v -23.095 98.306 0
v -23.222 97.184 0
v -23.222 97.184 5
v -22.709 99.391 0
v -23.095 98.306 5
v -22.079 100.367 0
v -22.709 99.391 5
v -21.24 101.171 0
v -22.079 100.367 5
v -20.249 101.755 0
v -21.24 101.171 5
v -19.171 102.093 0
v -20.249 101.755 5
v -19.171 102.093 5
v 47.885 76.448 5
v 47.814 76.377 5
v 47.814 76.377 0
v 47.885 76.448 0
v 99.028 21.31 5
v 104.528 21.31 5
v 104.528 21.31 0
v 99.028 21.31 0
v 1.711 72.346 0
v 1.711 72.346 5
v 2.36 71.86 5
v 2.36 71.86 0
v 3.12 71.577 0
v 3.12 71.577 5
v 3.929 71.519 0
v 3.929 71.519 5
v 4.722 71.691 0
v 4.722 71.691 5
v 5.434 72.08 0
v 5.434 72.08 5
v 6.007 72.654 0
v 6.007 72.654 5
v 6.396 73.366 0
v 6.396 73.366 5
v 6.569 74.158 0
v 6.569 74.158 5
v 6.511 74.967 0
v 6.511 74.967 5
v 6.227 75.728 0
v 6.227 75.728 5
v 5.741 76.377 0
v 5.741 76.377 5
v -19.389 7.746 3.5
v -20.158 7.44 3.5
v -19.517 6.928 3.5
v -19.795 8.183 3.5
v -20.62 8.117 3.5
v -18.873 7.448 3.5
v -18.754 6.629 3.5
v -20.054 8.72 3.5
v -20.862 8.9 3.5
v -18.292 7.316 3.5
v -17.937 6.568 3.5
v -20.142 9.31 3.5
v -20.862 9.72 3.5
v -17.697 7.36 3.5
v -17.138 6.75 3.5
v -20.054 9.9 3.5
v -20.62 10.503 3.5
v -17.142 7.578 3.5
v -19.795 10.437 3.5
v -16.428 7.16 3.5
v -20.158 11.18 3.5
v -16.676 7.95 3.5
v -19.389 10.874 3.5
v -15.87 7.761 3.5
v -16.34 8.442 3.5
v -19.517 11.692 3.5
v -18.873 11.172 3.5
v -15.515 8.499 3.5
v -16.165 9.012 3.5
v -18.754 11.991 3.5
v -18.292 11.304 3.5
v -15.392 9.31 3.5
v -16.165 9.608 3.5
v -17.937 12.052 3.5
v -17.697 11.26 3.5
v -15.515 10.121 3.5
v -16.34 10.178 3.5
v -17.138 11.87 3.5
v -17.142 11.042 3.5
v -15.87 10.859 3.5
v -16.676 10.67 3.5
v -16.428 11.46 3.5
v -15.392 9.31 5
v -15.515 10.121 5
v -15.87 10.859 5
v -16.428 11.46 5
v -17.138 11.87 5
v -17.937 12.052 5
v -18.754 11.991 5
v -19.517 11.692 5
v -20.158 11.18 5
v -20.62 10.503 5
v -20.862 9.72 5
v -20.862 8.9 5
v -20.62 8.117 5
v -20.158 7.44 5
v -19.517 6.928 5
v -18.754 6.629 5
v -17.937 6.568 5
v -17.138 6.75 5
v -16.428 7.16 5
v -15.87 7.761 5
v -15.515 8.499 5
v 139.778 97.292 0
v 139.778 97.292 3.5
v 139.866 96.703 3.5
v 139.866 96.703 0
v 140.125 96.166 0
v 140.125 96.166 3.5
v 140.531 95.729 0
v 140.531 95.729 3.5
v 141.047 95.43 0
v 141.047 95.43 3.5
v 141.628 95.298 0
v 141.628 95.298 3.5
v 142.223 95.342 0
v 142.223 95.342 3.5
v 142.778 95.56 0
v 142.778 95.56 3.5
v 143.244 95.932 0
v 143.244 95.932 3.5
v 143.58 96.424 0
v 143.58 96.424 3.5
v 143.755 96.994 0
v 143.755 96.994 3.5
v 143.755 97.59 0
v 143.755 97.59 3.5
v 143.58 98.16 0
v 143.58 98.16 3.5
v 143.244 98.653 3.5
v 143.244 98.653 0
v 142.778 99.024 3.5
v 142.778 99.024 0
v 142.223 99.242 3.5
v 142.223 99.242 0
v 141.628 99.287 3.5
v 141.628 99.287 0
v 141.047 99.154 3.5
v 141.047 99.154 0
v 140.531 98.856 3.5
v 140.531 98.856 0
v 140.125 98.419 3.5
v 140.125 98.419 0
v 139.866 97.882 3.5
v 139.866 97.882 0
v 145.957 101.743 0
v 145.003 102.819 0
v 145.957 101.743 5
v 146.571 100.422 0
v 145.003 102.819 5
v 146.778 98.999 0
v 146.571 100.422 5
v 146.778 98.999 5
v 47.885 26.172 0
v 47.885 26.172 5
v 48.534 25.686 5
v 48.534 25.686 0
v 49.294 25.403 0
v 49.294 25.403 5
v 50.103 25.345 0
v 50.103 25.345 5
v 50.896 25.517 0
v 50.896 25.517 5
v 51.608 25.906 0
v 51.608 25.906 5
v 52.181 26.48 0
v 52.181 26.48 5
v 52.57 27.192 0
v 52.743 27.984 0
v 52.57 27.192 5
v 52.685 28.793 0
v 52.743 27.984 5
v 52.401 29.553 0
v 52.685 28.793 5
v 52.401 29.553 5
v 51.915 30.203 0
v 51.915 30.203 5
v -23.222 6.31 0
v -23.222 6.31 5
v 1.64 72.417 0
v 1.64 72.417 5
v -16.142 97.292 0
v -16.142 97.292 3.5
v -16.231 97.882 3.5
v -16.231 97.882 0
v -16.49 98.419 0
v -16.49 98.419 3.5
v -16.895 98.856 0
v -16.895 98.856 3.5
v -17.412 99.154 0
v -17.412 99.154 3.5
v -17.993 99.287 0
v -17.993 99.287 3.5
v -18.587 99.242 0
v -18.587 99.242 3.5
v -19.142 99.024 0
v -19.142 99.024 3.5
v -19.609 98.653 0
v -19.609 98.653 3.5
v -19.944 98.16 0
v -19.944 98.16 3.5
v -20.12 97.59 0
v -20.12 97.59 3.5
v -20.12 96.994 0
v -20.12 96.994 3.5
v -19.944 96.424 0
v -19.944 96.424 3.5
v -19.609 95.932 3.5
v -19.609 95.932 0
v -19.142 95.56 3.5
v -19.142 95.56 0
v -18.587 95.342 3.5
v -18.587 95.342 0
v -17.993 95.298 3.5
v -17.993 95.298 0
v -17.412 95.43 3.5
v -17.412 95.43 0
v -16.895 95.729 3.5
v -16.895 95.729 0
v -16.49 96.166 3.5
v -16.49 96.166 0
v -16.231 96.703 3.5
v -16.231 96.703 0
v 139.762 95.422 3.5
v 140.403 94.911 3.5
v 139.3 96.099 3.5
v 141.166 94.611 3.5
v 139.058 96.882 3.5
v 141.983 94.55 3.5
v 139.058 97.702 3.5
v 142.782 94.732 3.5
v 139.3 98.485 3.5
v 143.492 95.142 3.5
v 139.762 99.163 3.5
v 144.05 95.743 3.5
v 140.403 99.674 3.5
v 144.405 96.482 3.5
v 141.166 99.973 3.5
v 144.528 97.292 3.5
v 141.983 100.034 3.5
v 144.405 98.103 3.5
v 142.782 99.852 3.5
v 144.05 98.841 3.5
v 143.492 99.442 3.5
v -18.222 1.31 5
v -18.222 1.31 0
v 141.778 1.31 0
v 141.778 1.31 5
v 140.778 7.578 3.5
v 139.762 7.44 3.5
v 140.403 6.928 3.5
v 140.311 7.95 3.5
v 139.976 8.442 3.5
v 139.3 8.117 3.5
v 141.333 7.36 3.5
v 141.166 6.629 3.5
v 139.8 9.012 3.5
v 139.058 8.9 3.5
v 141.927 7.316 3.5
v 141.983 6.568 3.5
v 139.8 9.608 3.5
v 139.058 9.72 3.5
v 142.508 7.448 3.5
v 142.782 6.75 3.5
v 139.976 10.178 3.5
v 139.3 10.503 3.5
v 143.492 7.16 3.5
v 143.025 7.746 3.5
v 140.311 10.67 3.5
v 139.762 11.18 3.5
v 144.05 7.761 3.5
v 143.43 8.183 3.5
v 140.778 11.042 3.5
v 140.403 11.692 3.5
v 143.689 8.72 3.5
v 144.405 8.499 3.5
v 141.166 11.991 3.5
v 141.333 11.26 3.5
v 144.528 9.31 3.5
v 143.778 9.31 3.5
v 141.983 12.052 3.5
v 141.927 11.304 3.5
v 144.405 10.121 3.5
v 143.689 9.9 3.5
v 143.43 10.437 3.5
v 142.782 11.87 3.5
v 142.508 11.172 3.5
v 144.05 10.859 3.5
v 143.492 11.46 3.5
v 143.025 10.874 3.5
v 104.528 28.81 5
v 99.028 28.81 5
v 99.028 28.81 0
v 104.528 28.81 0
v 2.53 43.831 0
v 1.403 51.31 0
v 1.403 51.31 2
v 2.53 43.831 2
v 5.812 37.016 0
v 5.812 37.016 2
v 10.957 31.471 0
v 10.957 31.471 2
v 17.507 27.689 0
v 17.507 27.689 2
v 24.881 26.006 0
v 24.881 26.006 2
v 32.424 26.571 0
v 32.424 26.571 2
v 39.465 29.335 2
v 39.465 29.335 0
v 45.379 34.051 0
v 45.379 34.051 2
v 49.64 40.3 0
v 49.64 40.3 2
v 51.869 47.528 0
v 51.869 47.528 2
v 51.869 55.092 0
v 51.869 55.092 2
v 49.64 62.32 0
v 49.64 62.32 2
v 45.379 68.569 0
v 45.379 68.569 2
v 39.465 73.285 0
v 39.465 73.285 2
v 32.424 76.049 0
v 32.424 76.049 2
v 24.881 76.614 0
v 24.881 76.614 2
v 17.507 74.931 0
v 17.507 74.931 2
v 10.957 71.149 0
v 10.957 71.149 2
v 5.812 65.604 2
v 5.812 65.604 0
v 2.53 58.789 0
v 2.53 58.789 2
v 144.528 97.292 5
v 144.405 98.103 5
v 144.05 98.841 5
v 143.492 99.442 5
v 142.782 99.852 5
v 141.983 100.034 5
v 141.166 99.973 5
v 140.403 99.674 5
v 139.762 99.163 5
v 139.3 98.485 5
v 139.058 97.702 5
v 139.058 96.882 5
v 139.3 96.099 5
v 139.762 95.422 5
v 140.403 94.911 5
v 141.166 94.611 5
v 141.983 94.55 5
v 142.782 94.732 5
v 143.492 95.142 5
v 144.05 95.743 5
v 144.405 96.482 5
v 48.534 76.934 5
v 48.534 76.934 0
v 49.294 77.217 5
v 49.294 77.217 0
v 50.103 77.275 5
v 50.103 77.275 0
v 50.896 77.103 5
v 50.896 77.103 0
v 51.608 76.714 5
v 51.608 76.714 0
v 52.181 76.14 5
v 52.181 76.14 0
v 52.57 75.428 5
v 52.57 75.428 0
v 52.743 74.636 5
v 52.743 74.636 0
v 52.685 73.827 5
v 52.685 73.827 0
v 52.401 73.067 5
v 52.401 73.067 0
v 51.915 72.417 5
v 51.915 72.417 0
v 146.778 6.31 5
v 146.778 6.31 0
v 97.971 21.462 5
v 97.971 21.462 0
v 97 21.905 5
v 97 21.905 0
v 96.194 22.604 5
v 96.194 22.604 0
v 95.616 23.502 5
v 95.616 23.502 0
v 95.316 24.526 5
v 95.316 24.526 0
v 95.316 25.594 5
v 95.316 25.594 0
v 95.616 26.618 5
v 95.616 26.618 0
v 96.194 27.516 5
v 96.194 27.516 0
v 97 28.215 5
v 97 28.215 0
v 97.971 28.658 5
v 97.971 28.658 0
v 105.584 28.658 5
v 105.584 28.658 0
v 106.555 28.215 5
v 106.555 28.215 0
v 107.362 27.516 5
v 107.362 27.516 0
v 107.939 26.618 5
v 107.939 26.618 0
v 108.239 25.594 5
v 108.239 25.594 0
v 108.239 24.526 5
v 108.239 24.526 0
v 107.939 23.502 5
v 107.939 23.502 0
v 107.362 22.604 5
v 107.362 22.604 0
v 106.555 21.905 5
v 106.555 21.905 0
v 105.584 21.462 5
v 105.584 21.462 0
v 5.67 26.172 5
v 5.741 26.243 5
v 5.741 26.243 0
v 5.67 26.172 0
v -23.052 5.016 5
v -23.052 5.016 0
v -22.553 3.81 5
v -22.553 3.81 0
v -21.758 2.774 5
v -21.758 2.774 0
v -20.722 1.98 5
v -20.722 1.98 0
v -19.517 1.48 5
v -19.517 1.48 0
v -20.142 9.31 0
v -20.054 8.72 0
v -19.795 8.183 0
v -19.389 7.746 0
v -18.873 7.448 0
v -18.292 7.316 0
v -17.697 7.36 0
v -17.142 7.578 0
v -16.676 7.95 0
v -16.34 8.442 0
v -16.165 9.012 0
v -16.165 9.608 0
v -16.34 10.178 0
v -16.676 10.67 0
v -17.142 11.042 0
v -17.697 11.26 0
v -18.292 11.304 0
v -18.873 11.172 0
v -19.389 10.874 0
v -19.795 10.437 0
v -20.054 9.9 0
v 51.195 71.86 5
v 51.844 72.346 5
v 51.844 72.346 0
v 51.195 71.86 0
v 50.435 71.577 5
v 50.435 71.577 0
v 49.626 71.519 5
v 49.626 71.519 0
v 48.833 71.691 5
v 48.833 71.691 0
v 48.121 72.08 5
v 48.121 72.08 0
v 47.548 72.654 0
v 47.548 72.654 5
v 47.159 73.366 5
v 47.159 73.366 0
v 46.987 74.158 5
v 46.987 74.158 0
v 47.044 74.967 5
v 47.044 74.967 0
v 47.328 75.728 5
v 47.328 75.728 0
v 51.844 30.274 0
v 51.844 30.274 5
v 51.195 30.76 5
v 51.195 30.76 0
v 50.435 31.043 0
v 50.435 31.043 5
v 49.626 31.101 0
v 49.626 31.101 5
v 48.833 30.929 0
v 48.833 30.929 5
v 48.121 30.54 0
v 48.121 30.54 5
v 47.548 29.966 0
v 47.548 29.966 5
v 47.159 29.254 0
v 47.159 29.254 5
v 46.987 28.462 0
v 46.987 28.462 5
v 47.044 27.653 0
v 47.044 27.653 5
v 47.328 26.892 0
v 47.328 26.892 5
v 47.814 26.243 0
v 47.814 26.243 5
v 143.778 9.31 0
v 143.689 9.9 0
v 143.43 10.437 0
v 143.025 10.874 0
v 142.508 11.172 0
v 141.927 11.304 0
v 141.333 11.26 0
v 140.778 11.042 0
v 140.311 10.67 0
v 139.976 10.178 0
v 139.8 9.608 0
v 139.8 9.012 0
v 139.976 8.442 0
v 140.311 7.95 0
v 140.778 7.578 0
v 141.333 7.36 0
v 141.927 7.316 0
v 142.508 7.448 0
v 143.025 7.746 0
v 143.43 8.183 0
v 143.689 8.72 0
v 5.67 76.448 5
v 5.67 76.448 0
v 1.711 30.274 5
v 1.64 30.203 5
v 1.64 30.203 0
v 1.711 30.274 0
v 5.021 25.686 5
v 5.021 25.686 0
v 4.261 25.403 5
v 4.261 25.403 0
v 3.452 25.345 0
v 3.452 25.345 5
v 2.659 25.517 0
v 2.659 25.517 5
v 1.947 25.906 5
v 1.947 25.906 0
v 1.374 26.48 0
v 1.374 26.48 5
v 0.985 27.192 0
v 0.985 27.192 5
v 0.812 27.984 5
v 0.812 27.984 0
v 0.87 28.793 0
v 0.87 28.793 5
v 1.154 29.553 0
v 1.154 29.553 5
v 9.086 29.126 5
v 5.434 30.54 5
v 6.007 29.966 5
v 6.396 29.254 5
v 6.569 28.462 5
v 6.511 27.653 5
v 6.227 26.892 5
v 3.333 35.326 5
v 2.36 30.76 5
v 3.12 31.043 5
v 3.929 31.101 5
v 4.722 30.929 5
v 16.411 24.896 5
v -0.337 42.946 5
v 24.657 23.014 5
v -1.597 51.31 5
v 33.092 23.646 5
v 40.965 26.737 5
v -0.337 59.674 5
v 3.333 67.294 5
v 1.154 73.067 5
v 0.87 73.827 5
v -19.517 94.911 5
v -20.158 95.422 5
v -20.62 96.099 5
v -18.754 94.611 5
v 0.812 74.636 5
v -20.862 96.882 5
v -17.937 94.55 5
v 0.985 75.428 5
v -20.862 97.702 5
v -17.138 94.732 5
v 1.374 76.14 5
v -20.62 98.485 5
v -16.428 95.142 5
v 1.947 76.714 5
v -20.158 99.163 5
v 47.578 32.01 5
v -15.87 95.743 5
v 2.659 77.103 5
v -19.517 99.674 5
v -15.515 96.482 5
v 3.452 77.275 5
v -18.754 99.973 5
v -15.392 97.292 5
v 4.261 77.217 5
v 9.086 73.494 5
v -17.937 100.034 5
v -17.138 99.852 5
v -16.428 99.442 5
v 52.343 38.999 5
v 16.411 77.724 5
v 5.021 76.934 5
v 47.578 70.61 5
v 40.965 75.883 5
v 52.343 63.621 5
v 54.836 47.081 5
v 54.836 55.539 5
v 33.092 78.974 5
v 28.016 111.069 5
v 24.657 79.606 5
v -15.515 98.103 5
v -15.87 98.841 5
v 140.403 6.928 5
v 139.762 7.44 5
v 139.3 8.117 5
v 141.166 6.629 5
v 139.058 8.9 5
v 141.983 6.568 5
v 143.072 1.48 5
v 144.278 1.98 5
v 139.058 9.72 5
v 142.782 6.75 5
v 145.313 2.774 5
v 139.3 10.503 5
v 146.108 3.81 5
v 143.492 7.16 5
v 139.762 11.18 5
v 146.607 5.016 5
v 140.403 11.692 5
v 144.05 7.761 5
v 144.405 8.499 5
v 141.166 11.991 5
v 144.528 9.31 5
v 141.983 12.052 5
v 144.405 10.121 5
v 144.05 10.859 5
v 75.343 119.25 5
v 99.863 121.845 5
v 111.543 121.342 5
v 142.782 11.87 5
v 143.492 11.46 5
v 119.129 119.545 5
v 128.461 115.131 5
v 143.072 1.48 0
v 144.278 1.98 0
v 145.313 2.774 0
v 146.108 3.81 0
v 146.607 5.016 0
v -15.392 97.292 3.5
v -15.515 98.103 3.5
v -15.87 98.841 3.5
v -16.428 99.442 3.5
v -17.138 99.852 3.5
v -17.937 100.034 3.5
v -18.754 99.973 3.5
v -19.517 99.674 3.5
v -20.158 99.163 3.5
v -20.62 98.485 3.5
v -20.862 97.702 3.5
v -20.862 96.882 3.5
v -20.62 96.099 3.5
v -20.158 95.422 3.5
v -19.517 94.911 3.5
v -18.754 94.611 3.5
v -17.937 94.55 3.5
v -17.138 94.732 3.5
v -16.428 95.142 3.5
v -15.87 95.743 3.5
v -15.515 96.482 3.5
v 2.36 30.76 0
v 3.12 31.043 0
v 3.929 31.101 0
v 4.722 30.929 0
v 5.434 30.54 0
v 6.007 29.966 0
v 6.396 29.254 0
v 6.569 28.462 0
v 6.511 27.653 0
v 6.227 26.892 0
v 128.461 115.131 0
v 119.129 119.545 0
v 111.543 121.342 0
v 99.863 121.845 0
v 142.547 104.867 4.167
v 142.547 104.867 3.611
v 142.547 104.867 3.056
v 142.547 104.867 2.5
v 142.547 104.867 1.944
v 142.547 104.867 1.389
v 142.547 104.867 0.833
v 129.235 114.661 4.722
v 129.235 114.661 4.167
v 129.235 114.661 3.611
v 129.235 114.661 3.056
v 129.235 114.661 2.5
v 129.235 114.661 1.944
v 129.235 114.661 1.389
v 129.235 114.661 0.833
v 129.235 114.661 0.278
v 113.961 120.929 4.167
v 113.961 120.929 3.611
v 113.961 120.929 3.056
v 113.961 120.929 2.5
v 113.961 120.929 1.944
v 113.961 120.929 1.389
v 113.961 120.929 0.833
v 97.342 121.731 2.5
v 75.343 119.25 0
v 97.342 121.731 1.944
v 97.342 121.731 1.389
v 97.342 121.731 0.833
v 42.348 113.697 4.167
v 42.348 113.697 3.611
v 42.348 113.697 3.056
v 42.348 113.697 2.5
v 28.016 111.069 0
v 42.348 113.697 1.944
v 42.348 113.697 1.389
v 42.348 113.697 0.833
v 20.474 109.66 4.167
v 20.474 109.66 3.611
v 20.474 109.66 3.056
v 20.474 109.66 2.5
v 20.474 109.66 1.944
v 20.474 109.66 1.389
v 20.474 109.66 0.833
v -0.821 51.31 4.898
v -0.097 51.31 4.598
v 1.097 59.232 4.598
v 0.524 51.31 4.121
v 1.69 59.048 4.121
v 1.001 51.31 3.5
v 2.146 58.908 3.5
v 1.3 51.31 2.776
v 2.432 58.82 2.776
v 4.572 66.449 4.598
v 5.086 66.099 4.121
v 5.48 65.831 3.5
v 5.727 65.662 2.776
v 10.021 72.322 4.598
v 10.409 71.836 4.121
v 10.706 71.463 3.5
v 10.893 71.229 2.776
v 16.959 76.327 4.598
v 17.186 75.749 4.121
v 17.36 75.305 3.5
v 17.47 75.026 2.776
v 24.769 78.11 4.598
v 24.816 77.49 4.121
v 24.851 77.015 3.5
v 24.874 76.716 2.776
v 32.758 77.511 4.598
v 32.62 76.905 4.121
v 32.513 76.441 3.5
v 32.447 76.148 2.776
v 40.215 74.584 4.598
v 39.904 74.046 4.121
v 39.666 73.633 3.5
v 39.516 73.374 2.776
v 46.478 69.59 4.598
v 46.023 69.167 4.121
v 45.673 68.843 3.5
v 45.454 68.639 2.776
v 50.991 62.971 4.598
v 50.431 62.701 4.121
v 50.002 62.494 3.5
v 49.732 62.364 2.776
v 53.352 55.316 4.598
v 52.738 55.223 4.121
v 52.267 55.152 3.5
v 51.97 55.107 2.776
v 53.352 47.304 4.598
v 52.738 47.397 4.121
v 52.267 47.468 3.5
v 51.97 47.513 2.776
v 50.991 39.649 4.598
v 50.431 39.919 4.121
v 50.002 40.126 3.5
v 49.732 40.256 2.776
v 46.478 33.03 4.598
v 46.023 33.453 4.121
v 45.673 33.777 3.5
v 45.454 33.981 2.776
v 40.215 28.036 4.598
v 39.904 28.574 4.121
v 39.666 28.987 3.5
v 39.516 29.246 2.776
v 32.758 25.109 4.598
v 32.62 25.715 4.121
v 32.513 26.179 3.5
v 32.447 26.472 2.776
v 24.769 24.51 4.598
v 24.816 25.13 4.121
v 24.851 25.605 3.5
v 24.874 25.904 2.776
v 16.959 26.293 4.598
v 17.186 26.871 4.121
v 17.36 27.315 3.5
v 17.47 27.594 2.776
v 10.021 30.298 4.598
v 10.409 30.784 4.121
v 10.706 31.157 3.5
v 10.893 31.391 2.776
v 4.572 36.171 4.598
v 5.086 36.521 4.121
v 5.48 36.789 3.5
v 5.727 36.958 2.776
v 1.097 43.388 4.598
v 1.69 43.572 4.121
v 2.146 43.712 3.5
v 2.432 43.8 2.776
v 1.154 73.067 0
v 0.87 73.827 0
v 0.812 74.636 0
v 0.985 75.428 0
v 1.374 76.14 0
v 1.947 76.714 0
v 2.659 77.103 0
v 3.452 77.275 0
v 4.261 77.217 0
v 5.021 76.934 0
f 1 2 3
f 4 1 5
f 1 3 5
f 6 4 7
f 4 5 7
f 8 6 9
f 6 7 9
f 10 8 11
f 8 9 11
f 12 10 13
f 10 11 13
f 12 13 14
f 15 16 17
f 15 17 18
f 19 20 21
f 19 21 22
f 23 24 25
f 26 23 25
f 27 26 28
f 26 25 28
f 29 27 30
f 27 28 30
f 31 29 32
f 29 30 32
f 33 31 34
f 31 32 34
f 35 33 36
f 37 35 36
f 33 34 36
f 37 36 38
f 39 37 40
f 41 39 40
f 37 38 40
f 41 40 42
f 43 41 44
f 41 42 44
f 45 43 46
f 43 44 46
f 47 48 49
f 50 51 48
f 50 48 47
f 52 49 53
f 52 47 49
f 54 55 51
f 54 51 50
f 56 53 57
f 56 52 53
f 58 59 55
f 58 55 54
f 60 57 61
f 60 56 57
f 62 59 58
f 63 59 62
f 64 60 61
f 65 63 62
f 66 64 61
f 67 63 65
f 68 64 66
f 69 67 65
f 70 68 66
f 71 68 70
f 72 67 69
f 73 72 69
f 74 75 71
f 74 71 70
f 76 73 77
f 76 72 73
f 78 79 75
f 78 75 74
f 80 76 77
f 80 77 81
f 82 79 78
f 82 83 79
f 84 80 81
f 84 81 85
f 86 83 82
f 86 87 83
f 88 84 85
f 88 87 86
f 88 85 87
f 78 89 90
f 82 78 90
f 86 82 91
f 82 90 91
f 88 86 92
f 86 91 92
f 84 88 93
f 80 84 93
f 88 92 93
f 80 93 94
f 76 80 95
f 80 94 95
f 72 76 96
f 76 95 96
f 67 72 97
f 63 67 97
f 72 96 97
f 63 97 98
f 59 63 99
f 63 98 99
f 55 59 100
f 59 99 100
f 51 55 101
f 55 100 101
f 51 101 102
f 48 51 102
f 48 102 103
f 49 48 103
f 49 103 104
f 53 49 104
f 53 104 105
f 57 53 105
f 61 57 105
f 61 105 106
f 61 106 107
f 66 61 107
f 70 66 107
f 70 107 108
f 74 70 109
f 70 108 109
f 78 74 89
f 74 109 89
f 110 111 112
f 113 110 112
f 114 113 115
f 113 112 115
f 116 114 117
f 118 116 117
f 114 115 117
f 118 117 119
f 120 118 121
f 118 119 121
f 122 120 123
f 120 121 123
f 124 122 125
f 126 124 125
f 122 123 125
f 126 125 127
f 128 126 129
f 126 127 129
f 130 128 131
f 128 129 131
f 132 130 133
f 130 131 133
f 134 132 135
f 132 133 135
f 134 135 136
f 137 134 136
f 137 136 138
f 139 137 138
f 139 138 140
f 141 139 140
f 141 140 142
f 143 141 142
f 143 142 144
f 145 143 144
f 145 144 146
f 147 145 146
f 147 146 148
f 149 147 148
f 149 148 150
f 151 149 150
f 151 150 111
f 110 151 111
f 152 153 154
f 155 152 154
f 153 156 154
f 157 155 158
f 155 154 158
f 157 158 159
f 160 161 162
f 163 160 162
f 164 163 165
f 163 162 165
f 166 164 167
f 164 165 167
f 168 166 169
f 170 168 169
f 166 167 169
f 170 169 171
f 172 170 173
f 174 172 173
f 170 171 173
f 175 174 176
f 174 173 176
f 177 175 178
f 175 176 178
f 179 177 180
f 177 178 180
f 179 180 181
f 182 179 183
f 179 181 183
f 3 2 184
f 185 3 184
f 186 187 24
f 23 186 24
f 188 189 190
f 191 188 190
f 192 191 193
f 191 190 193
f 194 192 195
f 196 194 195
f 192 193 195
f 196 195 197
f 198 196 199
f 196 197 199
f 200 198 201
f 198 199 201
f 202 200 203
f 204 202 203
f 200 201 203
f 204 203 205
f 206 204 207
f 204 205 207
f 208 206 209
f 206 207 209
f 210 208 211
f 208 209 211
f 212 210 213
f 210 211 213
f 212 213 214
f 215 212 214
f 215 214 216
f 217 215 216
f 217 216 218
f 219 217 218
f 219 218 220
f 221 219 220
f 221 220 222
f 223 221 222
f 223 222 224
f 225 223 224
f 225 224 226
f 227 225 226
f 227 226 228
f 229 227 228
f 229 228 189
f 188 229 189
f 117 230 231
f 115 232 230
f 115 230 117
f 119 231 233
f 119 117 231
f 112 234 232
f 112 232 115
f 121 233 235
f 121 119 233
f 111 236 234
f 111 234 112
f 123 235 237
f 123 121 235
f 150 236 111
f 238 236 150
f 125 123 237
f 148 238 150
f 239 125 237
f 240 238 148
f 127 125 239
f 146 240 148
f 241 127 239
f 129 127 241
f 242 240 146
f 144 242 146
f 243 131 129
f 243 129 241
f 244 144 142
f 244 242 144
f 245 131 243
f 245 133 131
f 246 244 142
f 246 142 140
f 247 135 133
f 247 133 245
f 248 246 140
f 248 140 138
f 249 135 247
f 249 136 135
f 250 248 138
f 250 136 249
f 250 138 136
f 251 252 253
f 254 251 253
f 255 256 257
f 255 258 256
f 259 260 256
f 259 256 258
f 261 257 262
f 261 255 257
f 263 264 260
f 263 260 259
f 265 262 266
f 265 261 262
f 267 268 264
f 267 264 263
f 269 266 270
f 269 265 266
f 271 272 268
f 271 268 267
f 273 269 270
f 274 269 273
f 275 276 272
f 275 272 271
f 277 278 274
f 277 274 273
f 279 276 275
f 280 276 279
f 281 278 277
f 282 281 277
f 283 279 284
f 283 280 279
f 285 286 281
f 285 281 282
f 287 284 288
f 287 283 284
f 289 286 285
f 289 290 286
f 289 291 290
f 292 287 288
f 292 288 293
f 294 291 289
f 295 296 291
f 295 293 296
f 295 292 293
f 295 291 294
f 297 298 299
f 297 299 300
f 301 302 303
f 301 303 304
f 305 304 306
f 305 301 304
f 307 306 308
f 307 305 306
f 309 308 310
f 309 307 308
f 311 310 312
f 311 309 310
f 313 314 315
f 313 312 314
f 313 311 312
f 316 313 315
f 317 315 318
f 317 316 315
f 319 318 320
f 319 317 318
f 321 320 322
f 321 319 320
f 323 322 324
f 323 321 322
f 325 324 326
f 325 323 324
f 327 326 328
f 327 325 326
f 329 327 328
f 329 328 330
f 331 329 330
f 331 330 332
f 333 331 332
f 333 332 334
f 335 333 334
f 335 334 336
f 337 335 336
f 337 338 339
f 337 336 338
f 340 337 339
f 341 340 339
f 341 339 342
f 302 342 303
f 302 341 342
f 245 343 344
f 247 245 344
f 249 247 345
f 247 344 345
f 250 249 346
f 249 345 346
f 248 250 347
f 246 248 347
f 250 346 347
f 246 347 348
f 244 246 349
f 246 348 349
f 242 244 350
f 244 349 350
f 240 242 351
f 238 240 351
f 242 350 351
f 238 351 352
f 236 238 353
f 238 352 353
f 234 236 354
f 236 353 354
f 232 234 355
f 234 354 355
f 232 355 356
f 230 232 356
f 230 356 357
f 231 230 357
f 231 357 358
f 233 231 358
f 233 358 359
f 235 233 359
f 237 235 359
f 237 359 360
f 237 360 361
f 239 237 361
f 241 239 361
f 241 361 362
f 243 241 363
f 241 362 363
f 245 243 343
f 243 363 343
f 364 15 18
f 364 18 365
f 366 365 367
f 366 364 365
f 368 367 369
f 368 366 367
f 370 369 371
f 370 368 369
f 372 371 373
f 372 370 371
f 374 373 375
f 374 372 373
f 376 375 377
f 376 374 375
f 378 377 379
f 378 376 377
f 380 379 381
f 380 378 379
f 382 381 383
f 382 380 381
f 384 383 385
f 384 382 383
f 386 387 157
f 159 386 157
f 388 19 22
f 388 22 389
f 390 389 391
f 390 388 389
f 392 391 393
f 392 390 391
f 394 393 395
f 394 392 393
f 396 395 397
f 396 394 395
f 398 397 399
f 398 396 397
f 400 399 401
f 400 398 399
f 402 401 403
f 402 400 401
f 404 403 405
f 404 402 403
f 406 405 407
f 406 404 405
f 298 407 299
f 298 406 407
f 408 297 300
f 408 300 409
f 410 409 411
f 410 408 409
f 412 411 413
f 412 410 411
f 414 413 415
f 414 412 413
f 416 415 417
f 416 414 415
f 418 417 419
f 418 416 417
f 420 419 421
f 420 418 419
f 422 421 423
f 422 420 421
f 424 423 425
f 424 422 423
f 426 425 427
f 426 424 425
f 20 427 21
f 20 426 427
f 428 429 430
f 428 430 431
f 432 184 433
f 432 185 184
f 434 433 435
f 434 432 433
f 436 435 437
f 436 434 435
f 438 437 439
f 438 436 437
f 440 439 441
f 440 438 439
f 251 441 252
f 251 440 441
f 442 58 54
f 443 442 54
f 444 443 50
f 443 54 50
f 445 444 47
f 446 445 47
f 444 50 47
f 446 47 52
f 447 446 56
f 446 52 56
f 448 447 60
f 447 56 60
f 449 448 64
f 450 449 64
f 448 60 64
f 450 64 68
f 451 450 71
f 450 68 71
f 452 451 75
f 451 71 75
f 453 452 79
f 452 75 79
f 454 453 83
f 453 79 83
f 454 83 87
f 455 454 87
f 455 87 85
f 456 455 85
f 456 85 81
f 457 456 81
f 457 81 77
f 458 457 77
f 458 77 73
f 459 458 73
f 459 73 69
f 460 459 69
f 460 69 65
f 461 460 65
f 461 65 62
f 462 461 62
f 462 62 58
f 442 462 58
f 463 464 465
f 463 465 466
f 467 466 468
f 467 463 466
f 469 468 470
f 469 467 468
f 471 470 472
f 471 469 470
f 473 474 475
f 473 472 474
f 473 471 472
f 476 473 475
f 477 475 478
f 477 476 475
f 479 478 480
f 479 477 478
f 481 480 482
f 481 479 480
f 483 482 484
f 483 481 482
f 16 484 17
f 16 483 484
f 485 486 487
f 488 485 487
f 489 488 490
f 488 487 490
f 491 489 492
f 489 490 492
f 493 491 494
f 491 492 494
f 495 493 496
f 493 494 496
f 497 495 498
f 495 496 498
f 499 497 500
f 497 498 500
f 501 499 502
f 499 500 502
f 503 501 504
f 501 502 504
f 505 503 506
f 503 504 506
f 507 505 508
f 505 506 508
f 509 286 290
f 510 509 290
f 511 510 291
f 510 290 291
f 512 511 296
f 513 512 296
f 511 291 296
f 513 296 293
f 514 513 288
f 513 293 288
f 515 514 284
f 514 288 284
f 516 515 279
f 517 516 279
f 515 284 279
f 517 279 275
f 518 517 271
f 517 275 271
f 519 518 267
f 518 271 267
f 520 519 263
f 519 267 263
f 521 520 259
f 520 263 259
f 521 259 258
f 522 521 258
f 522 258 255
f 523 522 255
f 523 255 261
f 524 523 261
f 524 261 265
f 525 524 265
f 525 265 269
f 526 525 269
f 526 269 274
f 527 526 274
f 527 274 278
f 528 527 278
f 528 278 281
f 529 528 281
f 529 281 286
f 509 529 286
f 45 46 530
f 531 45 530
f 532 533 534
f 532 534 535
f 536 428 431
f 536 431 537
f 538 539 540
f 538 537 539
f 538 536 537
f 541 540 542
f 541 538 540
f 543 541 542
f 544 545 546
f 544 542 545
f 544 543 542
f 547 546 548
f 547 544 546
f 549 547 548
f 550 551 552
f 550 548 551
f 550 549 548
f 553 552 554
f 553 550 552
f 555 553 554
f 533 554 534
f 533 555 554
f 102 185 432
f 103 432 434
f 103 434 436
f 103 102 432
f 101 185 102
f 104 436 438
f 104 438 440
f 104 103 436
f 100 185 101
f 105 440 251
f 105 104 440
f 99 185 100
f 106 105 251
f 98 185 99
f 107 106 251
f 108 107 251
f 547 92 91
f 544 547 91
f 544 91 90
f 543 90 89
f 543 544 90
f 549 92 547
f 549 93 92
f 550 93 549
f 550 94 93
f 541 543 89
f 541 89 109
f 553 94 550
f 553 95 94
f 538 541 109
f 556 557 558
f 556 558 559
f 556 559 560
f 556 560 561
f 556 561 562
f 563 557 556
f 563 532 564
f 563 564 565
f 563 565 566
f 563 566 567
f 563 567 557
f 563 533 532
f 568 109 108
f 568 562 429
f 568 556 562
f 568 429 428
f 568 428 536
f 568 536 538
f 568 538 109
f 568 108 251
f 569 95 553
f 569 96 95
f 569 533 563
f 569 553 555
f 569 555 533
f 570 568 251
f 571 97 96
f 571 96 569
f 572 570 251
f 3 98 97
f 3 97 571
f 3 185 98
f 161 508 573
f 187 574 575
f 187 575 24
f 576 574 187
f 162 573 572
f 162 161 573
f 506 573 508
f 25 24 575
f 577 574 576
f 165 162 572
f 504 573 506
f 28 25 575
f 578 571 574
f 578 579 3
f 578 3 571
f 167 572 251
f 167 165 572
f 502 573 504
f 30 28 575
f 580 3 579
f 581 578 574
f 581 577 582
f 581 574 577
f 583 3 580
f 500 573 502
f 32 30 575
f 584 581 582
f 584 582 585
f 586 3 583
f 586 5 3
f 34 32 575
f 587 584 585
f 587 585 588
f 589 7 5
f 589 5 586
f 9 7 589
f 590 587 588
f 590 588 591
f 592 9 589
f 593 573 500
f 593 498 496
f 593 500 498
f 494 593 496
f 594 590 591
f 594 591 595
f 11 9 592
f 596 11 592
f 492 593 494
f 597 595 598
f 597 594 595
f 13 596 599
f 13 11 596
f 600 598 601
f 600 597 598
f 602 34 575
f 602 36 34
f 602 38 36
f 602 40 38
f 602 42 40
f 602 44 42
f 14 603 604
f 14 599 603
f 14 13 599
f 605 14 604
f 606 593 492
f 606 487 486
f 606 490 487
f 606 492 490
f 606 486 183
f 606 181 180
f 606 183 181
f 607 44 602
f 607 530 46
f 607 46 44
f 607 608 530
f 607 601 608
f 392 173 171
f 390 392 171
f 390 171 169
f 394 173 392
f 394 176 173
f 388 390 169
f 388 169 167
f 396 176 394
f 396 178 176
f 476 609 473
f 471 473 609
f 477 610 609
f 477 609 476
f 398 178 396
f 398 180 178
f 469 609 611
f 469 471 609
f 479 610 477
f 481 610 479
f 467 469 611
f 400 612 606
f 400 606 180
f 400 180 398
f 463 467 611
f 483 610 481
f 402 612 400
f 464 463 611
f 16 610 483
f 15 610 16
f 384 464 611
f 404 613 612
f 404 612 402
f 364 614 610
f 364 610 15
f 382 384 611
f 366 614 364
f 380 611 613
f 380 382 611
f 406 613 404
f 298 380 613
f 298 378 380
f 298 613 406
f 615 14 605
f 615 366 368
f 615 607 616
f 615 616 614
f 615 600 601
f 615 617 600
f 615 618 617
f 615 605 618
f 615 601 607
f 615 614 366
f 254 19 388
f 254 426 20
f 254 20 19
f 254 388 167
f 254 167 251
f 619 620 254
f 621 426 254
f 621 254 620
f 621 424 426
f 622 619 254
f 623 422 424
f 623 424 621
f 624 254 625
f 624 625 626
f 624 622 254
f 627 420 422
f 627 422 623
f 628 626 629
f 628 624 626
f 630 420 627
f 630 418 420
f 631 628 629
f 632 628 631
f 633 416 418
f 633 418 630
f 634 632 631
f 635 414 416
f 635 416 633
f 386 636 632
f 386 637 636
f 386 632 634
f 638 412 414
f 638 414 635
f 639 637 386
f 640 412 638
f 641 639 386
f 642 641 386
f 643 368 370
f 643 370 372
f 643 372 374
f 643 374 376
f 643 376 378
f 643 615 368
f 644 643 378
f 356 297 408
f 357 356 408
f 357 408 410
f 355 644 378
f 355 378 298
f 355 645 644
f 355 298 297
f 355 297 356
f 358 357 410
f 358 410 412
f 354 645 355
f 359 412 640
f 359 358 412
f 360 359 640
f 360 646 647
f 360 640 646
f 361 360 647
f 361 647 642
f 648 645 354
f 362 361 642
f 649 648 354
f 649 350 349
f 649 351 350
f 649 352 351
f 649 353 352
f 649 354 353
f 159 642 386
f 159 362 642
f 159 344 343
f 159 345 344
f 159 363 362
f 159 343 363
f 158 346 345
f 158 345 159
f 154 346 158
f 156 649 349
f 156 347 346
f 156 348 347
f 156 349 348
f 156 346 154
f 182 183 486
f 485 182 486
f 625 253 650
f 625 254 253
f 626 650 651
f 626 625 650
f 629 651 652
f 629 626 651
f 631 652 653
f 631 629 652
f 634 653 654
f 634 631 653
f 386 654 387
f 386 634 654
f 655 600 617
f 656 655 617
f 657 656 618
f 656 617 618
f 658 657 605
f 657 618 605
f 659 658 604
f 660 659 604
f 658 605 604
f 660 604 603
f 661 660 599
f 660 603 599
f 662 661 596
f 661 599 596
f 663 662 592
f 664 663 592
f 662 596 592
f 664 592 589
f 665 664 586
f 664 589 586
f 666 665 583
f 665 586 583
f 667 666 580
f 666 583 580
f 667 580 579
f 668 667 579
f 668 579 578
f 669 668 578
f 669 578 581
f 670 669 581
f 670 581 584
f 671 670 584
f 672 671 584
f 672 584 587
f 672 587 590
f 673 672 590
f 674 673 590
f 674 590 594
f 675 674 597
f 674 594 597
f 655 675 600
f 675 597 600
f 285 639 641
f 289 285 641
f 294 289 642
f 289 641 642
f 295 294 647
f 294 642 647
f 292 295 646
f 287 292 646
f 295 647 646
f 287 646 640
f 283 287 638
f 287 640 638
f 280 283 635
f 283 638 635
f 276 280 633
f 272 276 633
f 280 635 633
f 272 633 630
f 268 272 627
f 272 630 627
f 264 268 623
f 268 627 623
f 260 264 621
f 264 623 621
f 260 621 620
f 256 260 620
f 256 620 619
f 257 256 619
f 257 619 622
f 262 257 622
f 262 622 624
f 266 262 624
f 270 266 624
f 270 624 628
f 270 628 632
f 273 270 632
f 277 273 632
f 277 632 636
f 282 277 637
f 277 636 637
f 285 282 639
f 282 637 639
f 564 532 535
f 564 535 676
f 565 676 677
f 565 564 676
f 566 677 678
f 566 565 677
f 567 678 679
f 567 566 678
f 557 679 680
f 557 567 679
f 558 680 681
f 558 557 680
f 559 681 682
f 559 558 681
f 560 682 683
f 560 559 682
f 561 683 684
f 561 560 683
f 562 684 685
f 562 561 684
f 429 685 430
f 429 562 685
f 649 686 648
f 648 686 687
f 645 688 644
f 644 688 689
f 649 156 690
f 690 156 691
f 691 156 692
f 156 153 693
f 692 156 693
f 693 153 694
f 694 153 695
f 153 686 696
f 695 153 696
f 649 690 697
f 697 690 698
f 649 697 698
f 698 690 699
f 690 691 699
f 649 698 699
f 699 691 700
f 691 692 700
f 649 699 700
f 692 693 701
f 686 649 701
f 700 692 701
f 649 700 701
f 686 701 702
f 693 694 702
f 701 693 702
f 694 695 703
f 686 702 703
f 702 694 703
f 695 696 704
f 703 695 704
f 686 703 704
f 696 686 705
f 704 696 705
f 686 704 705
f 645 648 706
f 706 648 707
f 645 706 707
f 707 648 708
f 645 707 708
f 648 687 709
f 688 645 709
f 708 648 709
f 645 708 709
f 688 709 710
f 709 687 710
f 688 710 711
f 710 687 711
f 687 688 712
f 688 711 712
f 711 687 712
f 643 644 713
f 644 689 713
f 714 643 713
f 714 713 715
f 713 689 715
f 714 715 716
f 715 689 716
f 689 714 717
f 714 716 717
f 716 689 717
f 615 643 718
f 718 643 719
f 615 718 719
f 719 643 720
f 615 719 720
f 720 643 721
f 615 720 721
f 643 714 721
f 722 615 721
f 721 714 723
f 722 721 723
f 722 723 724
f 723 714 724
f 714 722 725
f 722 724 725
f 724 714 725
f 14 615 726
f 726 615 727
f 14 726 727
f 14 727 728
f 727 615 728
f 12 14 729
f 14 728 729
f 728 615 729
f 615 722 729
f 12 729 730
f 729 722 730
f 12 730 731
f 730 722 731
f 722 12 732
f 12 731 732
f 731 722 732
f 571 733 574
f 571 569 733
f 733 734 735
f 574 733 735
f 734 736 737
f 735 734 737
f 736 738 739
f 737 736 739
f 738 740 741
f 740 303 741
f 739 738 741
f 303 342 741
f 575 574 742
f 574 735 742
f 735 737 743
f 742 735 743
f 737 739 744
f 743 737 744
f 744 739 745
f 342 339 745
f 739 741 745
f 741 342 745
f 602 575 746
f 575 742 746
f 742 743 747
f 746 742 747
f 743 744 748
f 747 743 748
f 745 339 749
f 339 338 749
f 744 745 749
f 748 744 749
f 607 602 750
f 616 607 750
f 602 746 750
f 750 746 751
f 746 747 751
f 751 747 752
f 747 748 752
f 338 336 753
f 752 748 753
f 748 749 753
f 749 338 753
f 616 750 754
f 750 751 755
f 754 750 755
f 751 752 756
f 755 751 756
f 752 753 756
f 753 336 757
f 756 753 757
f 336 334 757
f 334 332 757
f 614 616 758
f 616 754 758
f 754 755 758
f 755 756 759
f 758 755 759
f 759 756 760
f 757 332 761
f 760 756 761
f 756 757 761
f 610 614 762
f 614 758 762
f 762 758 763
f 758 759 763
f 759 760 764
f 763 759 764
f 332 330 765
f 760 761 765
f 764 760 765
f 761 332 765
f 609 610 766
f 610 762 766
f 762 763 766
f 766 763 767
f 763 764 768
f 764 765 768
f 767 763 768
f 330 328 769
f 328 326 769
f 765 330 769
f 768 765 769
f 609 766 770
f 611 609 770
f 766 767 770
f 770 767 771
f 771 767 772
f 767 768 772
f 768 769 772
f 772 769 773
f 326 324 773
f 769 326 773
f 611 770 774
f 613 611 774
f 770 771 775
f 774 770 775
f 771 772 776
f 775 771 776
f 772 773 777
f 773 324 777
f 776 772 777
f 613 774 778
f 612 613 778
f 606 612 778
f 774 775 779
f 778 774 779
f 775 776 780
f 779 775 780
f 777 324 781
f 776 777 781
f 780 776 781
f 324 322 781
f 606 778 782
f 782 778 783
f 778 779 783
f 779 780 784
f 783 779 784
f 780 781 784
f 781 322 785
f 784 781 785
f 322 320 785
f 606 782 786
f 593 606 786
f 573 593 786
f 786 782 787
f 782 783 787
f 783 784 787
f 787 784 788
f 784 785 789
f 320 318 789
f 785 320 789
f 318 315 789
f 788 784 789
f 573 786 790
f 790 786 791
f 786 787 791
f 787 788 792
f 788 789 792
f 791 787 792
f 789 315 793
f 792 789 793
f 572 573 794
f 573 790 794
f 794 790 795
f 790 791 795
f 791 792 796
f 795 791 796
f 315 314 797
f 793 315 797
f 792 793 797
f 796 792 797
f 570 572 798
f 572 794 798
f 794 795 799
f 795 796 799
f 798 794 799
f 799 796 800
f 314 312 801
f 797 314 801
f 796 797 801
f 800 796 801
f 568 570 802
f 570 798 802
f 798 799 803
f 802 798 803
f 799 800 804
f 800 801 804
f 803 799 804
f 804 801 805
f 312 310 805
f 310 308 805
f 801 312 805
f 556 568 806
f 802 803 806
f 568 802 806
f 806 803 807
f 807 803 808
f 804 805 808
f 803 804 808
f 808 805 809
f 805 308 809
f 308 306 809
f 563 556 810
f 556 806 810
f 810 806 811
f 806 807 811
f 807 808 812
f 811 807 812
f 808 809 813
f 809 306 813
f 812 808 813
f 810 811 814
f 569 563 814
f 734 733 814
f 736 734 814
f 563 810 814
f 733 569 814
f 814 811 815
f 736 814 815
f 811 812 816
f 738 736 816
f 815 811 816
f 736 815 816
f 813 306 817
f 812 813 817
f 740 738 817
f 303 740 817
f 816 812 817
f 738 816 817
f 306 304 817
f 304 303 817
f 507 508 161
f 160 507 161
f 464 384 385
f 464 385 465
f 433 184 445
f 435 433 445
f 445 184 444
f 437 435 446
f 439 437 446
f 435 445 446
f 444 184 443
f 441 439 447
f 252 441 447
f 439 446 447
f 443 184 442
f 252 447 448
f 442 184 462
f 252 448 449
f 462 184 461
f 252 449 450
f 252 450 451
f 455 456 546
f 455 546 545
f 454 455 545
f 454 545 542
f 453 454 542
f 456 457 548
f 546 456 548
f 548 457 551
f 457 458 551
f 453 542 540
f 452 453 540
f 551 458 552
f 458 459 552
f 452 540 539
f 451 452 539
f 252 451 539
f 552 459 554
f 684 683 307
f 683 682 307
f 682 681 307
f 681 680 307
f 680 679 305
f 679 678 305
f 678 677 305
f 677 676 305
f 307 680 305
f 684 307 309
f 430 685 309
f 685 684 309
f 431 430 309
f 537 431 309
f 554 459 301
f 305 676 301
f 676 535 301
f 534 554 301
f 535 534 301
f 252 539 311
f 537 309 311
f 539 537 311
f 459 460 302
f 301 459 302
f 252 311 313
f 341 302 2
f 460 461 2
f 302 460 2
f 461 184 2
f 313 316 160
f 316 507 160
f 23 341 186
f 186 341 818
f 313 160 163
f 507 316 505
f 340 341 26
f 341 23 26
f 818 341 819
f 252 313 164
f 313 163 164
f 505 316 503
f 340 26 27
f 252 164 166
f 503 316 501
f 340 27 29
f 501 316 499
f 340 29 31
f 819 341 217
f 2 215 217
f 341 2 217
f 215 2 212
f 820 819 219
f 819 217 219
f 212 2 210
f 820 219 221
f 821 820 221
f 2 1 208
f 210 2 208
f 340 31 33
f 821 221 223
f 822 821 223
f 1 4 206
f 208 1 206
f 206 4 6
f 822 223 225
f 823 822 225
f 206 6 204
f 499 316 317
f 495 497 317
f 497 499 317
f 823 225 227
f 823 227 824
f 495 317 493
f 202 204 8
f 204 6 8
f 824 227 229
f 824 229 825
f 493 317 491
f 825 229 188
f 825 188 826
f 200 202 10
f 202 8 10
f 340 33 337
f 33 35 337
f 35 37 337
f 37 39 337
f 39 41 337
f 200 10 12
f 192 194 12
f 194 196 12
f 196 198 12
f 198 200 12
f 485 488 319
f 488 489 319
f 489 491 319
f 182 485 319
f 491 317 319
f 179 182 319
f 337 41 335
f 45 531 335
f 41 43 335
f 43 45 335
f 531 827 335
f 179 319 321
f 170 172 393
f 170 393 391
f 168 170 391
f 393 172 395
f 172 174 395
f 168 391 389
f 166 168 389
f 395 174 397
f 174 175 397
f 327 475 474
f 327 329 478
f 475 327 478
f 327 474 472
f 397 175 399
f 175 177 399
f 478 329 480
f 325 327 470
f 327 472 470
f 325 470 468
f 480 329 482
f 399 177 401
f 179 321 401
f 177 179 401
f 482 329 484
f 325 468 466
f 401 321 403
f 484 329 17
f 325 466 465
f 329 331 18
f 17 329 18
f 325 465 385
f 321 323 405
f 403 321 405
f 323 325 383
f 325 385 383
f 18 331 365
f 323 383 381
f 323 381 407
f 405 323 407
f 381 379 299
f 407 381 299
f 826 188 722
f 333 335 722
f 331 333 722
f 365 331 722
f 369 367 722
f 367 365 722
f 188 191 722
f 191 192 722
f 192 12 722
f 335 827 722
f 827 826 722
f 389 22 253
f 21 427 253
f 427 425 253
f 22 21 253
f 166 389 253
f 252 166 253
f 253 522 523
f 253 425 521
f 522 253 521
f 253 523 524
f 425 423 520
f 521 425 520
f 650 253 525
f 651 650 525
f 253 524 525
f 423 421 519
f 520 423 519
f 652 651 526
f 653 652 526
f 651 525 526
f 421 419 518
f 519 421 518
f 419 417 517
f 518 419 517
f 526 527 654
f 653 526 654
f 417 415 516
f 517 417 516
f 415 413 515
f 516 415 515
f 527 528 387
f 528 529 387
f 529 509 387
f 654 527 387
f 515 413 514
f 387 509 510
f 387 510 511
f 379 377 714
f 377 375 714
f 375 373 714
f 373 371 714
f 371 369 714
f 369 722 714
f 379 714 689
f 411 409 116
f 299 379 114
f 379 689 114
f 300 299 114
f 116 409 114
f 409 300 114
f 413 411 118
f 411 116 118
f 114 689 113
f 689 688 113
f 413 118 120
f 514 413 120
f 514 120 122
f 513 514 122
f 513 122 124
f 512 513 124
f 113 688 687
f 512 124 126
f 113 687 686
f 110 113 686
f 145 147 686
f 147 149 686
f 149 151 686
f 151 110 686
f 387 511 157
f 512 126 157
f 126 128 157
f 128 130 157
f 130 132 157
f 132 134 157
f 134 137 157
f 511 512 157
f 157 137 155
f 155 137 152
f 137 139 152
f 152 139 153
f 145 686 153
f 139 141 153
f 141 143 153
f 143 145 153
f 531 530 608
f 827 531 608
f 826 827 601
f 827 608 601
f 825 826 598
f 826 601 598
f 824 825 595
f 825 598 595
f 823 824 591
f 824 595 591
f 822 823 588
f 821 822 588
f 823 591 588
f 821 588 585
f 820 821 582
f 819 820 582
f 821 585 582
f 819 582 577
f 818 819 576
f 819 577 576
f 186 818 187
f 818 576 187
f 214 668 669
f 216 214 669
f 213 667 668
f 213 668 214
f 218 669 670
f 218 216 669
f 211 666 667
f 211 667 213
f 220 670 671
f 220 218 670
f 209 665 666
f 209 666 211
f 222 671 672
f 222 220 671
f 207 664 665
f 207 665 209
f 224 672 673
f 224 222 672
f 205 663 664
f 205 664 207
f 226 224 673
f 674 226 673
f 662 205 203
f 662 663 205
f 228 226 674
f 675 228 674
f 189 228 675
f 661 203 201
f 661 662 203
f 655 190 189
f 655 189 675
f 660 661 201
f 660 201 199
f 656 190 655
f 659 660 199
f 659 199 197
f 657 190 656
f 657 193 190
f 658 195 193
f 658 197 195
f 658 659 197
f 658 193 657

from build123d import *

# Parameters (mm, degrees)
BOSS_EXTRU_1_DEPTH           = 5
ESQUISSE3_R                  = 2
ENL_V_MAT_EXTRU_1_DEPTH      = 5
ESQUISSE4_R                  = 2.75
ENL_V_MAT_EXTRU_2_DEPTH      = 1.5
ENL_V_MAT_EXTRU_3_DEPTH      = 5
ENL_V_MAT_EXTRU_3_DEPTH_BACK = 12.5
ESQUISSE5_R                  = 25.375
CONG_1_R                     = 3
CONG_2_R                     = 5
ENL_V_MAT_EXTRU_4_DEPTH      = 10
ENL_V_MAT_EXTRU_5_DEPTH      = 10


with BuildPart() as part:
    # Esquisse2 → Boss.-Extru.1 (new body)
    with BuildSketch(Plane.XY):
        with BuildLine():
            Line((-23.222436044, 101.309927053), (-23.222436044, 1.309999322))
            Line((-23.222436044, 1.309999322), (146.777563956, 1.309999322))
            Line((146.777563956, 1.309999322), (146.777563956, 101.30967935))
            add(Edge.make_bspline(
                [(146.777563956, 101.30967935), (145.378292327, 102.508699243), (143.969584716, 103.696244388), (141.124926397, 106.038205363), (139.688572163, 107.193033092), (136.777525095, 109.452247335), (135.305624265, 110.554710529), (132.312941473, 112.678620745), (130.792251165, 113.700219676), (127.677430057, 115.621696386), (126.083009921, 116.521094618), (123.612517857, 117.739485375), (122.775823394, 118.123742581), (121.071813997, 118.841506261), (120.201311014, 119.175853835), (117.565229929, 120.085558525), (115.777516182, 120.566804891), (112.144518509, 121.29157916), (110.293283793, 121.537221637), (106.597133423, 121.840020183), (104.747512209, 121.900433532), (101.046171299, 121.897761869), (99.194452085, 121.834705231), (95.489628441, 121.627070014), (93.63921765, 121.482100865), (89.947842728, 121.138535108), (88.105538062, 120.939709848), (82.585629662, 120.287230662), (78.914789341, 119.779509377), (71.58218577, 118.691503857), (67.920223281, 118.109593605), (56.945952512, 116.3014836), (49.644200811, 115.014768518), (35.051716985, 112.379241478), (27.761400742, 111.027882072), (5.899236405, 106.92561859), (-8.663476314, 104.127599978), (-23.222436044, 101.309927053)],
                knots=[0, 0, 0, 0, 0.03125, 0.03125, 0.0625, 0.0625, 0.09375, 0.09375, 0.125, 0.125, 0.15625, 0.15625, 0.171875, 0.171875, 0.1875, 0.1875, 0.21875, 0.21875, 0.25, 0.25, 0.28125, 0.28125, 0.3125, 0.3125, 0.34375, 0.34375, 0.375, 0.375, 0.4375, 0.4375, 0.5, 0.5, 0.625, 0.625, 0.75, 0.75, 1, 1, 1, 1], degree=3))
        make_face()
    extrude(amount=BOSS_EXTRU_1_DEPTH)

    # Esquisse3 → Enlèv. mat.-Extru.1 (cut)
    with BuildSketch(Plane.XY.offset(5)):
        with Locations((-18.142436044, 97.29218842)):
            Circle(ESQUISSE3_R)
        with Locations(Location((-18.142436044, 9.309999322, 0), (0, 0, 180))):
            Circle(ESQUISSE3_R)
        with Locations((141.777563956, 9.309999322)):
            Circle(ESQUISSE3_R)
        with Locations(Location((141.777563956, 97.29218842, 0), (0, 0, 180))):
            Circle(ESQUISSE3_R)
    extrude(amount=-ENL_V_MAT_EXTRU_1_DEPTH, mode=Mode.SUBTRACT)

    # Esquisse4 → Enlèv. mat.-Extru.2 (cut)
    with BuildSketch(Plane.XY.offset(5)):
        with Locations((-18.142436044, 97.29218842)):
            Circle(ESQUISSE4_R)
        with Locations((141.777563956, 97.29218842)):
            Circle(ESQUISSE4_R)
        with Locations((-18.142436044, 9.309999322)):
            Circle(ESQUISSE4_R)
        with Locations((141.777563956, 9.309999322)):
            Circle(ESQUISSE4_R)
    extrude(amount=-ENL_V_MAT_EXTRU_2_DEPTH, mode=Mode.SUBTRACT)

    # Esquisse5 → Enlèv. mat.-Extru.3 (cut, two sides: drawn at the far end of the back side and taken through both)
    with BuildSketch(Plane.XY.offset(5).offset(-ENL_V_MAT_EXTRU_3_DEPTH_BACK)):
        with Locations(Location((26.777563956, 51.309999322, 0), (0, 0, 180))):
            Circle(ESQUISSE5_R)
    extrude(amount=ENL_V_MAT_EXTRU_3_DEPTH + ENL_V_MAT_EXTRU_3_DEPTH_BACK, mode=Mode.SUBTRACT)

    # Congé1
    cong_1_edges = [part.edges().sort_by_distance(p)[0] for p in [
        (52.152563956, 51.309999322, 5),
    ]]
    fillet(cong_1_edges, radius=CONG_1_R)

    # Congé2
    cong_2_edges = [part.edges().sort_by_distance(p)[0] for p in [
        (146.777563956, 101.30967935, 2.5),
        (146.777563956, 1.309999322, 2.5),
        (-23.222436044, 1.309999322, 2.5),
        (-23.222436044, 101.309927053, 2.5),
    ]]
    fillet(cong_2_edges, radius=CONG_2_R)

    # Esquisse6 → Enlèv. mat.-Extru.4 (cut)
    with BuildSketch(Plane.XY.offset(5)):
        with BuildLine():
            Line((5.741137215, 76.376934715), (5.670426537, 76.447645393))
            ThreePointArc((5.670426537, 76.447645393), (1.639917885, 76.447645393), (1.639917885, 72.41713674))
            Line((1.639917885, 72.41713674), (1.710628563, 72.346426062))
            ThreePointArc((1.710628563, 72.346426062), (5.741137215, 72.346426062), (5.741137215, 76.376934715))
        make_face()
        with BuildLine():
            Line((47.813990696, 76.376934715), (47.884701374, 76.447645393))
            ThreePointArc((47.884701374, 76.447645393), (51.915210027, 76.447645393), (51.915210027, 72.41713674))
            Line((51.915210027, 72.41713674), (51.844499349, 72.346426062))
            ThreePointArc((51.844499349, 72.346426062), (47.813990696, 72.346426062), (47.813990696, 76.376934715))
        make_face()
        with BuildLine():
            Line((47.813990696, 26.243063929), (47.884701374, 26.172353251))
            ThreePointArc((47.884701374, 26.172353251), (51.915210027, 26.172353251), (51.915210027, 30.202861903))
            Line((51.915210027, 30.202861903), (51.844499349, 30.273572582))
            ThreePointArc((51.844499349, 30.273572582), (47.813990696, 30.273572582), (47.813990696, 26.243063929))
        make_face()
        with BuildLine():
            Line((5.741137215, 26.243063929), (5.670426537, 26.172353251))
            ThreePointArc((5.670426537, 26.172353251), (1.639917885, 26.172353251), (1.639917885, 30.202861903))
            Line((1.639917885, 30.202861903), (1.710628563, 30.273572582))
            ThreePointArc((1.710628563, 30.273572582), (5.741137215, 30.273572582), (5.741137215, 26.243063929))
        make_face()
    extrude(amount=-ENL_V_MAT_EXTRU_4_DEPTH, mode=Mode.SUBTRACT)

    # Esquisse7 → Enlèv. mat.-Extru.5 (cut)
    with BuildSketch(Plane.XY.offset(5)):
        with BuildLine():
            Line((99.027563956, 28.809999322), (104.527563956, 28.809999322))
            ThreePointArc((104.527563956, 28.809999322), (108.277563956, 25.059999322), (104.527563956, 21.309999322))
            Line((104.527563956, 21.309999322), (99.027563956, 21.309999322))
            ThreePointArc((99.027563956, 21.309999322), (95.277563956, 25.059999322), (99.027563956, 28.809999322))
        make_face()
    extrude(amount=-ENL_V_MAT_EXTRU_5_DEPTH, mode=Mode.SUBTRACT)


solid = part.part
